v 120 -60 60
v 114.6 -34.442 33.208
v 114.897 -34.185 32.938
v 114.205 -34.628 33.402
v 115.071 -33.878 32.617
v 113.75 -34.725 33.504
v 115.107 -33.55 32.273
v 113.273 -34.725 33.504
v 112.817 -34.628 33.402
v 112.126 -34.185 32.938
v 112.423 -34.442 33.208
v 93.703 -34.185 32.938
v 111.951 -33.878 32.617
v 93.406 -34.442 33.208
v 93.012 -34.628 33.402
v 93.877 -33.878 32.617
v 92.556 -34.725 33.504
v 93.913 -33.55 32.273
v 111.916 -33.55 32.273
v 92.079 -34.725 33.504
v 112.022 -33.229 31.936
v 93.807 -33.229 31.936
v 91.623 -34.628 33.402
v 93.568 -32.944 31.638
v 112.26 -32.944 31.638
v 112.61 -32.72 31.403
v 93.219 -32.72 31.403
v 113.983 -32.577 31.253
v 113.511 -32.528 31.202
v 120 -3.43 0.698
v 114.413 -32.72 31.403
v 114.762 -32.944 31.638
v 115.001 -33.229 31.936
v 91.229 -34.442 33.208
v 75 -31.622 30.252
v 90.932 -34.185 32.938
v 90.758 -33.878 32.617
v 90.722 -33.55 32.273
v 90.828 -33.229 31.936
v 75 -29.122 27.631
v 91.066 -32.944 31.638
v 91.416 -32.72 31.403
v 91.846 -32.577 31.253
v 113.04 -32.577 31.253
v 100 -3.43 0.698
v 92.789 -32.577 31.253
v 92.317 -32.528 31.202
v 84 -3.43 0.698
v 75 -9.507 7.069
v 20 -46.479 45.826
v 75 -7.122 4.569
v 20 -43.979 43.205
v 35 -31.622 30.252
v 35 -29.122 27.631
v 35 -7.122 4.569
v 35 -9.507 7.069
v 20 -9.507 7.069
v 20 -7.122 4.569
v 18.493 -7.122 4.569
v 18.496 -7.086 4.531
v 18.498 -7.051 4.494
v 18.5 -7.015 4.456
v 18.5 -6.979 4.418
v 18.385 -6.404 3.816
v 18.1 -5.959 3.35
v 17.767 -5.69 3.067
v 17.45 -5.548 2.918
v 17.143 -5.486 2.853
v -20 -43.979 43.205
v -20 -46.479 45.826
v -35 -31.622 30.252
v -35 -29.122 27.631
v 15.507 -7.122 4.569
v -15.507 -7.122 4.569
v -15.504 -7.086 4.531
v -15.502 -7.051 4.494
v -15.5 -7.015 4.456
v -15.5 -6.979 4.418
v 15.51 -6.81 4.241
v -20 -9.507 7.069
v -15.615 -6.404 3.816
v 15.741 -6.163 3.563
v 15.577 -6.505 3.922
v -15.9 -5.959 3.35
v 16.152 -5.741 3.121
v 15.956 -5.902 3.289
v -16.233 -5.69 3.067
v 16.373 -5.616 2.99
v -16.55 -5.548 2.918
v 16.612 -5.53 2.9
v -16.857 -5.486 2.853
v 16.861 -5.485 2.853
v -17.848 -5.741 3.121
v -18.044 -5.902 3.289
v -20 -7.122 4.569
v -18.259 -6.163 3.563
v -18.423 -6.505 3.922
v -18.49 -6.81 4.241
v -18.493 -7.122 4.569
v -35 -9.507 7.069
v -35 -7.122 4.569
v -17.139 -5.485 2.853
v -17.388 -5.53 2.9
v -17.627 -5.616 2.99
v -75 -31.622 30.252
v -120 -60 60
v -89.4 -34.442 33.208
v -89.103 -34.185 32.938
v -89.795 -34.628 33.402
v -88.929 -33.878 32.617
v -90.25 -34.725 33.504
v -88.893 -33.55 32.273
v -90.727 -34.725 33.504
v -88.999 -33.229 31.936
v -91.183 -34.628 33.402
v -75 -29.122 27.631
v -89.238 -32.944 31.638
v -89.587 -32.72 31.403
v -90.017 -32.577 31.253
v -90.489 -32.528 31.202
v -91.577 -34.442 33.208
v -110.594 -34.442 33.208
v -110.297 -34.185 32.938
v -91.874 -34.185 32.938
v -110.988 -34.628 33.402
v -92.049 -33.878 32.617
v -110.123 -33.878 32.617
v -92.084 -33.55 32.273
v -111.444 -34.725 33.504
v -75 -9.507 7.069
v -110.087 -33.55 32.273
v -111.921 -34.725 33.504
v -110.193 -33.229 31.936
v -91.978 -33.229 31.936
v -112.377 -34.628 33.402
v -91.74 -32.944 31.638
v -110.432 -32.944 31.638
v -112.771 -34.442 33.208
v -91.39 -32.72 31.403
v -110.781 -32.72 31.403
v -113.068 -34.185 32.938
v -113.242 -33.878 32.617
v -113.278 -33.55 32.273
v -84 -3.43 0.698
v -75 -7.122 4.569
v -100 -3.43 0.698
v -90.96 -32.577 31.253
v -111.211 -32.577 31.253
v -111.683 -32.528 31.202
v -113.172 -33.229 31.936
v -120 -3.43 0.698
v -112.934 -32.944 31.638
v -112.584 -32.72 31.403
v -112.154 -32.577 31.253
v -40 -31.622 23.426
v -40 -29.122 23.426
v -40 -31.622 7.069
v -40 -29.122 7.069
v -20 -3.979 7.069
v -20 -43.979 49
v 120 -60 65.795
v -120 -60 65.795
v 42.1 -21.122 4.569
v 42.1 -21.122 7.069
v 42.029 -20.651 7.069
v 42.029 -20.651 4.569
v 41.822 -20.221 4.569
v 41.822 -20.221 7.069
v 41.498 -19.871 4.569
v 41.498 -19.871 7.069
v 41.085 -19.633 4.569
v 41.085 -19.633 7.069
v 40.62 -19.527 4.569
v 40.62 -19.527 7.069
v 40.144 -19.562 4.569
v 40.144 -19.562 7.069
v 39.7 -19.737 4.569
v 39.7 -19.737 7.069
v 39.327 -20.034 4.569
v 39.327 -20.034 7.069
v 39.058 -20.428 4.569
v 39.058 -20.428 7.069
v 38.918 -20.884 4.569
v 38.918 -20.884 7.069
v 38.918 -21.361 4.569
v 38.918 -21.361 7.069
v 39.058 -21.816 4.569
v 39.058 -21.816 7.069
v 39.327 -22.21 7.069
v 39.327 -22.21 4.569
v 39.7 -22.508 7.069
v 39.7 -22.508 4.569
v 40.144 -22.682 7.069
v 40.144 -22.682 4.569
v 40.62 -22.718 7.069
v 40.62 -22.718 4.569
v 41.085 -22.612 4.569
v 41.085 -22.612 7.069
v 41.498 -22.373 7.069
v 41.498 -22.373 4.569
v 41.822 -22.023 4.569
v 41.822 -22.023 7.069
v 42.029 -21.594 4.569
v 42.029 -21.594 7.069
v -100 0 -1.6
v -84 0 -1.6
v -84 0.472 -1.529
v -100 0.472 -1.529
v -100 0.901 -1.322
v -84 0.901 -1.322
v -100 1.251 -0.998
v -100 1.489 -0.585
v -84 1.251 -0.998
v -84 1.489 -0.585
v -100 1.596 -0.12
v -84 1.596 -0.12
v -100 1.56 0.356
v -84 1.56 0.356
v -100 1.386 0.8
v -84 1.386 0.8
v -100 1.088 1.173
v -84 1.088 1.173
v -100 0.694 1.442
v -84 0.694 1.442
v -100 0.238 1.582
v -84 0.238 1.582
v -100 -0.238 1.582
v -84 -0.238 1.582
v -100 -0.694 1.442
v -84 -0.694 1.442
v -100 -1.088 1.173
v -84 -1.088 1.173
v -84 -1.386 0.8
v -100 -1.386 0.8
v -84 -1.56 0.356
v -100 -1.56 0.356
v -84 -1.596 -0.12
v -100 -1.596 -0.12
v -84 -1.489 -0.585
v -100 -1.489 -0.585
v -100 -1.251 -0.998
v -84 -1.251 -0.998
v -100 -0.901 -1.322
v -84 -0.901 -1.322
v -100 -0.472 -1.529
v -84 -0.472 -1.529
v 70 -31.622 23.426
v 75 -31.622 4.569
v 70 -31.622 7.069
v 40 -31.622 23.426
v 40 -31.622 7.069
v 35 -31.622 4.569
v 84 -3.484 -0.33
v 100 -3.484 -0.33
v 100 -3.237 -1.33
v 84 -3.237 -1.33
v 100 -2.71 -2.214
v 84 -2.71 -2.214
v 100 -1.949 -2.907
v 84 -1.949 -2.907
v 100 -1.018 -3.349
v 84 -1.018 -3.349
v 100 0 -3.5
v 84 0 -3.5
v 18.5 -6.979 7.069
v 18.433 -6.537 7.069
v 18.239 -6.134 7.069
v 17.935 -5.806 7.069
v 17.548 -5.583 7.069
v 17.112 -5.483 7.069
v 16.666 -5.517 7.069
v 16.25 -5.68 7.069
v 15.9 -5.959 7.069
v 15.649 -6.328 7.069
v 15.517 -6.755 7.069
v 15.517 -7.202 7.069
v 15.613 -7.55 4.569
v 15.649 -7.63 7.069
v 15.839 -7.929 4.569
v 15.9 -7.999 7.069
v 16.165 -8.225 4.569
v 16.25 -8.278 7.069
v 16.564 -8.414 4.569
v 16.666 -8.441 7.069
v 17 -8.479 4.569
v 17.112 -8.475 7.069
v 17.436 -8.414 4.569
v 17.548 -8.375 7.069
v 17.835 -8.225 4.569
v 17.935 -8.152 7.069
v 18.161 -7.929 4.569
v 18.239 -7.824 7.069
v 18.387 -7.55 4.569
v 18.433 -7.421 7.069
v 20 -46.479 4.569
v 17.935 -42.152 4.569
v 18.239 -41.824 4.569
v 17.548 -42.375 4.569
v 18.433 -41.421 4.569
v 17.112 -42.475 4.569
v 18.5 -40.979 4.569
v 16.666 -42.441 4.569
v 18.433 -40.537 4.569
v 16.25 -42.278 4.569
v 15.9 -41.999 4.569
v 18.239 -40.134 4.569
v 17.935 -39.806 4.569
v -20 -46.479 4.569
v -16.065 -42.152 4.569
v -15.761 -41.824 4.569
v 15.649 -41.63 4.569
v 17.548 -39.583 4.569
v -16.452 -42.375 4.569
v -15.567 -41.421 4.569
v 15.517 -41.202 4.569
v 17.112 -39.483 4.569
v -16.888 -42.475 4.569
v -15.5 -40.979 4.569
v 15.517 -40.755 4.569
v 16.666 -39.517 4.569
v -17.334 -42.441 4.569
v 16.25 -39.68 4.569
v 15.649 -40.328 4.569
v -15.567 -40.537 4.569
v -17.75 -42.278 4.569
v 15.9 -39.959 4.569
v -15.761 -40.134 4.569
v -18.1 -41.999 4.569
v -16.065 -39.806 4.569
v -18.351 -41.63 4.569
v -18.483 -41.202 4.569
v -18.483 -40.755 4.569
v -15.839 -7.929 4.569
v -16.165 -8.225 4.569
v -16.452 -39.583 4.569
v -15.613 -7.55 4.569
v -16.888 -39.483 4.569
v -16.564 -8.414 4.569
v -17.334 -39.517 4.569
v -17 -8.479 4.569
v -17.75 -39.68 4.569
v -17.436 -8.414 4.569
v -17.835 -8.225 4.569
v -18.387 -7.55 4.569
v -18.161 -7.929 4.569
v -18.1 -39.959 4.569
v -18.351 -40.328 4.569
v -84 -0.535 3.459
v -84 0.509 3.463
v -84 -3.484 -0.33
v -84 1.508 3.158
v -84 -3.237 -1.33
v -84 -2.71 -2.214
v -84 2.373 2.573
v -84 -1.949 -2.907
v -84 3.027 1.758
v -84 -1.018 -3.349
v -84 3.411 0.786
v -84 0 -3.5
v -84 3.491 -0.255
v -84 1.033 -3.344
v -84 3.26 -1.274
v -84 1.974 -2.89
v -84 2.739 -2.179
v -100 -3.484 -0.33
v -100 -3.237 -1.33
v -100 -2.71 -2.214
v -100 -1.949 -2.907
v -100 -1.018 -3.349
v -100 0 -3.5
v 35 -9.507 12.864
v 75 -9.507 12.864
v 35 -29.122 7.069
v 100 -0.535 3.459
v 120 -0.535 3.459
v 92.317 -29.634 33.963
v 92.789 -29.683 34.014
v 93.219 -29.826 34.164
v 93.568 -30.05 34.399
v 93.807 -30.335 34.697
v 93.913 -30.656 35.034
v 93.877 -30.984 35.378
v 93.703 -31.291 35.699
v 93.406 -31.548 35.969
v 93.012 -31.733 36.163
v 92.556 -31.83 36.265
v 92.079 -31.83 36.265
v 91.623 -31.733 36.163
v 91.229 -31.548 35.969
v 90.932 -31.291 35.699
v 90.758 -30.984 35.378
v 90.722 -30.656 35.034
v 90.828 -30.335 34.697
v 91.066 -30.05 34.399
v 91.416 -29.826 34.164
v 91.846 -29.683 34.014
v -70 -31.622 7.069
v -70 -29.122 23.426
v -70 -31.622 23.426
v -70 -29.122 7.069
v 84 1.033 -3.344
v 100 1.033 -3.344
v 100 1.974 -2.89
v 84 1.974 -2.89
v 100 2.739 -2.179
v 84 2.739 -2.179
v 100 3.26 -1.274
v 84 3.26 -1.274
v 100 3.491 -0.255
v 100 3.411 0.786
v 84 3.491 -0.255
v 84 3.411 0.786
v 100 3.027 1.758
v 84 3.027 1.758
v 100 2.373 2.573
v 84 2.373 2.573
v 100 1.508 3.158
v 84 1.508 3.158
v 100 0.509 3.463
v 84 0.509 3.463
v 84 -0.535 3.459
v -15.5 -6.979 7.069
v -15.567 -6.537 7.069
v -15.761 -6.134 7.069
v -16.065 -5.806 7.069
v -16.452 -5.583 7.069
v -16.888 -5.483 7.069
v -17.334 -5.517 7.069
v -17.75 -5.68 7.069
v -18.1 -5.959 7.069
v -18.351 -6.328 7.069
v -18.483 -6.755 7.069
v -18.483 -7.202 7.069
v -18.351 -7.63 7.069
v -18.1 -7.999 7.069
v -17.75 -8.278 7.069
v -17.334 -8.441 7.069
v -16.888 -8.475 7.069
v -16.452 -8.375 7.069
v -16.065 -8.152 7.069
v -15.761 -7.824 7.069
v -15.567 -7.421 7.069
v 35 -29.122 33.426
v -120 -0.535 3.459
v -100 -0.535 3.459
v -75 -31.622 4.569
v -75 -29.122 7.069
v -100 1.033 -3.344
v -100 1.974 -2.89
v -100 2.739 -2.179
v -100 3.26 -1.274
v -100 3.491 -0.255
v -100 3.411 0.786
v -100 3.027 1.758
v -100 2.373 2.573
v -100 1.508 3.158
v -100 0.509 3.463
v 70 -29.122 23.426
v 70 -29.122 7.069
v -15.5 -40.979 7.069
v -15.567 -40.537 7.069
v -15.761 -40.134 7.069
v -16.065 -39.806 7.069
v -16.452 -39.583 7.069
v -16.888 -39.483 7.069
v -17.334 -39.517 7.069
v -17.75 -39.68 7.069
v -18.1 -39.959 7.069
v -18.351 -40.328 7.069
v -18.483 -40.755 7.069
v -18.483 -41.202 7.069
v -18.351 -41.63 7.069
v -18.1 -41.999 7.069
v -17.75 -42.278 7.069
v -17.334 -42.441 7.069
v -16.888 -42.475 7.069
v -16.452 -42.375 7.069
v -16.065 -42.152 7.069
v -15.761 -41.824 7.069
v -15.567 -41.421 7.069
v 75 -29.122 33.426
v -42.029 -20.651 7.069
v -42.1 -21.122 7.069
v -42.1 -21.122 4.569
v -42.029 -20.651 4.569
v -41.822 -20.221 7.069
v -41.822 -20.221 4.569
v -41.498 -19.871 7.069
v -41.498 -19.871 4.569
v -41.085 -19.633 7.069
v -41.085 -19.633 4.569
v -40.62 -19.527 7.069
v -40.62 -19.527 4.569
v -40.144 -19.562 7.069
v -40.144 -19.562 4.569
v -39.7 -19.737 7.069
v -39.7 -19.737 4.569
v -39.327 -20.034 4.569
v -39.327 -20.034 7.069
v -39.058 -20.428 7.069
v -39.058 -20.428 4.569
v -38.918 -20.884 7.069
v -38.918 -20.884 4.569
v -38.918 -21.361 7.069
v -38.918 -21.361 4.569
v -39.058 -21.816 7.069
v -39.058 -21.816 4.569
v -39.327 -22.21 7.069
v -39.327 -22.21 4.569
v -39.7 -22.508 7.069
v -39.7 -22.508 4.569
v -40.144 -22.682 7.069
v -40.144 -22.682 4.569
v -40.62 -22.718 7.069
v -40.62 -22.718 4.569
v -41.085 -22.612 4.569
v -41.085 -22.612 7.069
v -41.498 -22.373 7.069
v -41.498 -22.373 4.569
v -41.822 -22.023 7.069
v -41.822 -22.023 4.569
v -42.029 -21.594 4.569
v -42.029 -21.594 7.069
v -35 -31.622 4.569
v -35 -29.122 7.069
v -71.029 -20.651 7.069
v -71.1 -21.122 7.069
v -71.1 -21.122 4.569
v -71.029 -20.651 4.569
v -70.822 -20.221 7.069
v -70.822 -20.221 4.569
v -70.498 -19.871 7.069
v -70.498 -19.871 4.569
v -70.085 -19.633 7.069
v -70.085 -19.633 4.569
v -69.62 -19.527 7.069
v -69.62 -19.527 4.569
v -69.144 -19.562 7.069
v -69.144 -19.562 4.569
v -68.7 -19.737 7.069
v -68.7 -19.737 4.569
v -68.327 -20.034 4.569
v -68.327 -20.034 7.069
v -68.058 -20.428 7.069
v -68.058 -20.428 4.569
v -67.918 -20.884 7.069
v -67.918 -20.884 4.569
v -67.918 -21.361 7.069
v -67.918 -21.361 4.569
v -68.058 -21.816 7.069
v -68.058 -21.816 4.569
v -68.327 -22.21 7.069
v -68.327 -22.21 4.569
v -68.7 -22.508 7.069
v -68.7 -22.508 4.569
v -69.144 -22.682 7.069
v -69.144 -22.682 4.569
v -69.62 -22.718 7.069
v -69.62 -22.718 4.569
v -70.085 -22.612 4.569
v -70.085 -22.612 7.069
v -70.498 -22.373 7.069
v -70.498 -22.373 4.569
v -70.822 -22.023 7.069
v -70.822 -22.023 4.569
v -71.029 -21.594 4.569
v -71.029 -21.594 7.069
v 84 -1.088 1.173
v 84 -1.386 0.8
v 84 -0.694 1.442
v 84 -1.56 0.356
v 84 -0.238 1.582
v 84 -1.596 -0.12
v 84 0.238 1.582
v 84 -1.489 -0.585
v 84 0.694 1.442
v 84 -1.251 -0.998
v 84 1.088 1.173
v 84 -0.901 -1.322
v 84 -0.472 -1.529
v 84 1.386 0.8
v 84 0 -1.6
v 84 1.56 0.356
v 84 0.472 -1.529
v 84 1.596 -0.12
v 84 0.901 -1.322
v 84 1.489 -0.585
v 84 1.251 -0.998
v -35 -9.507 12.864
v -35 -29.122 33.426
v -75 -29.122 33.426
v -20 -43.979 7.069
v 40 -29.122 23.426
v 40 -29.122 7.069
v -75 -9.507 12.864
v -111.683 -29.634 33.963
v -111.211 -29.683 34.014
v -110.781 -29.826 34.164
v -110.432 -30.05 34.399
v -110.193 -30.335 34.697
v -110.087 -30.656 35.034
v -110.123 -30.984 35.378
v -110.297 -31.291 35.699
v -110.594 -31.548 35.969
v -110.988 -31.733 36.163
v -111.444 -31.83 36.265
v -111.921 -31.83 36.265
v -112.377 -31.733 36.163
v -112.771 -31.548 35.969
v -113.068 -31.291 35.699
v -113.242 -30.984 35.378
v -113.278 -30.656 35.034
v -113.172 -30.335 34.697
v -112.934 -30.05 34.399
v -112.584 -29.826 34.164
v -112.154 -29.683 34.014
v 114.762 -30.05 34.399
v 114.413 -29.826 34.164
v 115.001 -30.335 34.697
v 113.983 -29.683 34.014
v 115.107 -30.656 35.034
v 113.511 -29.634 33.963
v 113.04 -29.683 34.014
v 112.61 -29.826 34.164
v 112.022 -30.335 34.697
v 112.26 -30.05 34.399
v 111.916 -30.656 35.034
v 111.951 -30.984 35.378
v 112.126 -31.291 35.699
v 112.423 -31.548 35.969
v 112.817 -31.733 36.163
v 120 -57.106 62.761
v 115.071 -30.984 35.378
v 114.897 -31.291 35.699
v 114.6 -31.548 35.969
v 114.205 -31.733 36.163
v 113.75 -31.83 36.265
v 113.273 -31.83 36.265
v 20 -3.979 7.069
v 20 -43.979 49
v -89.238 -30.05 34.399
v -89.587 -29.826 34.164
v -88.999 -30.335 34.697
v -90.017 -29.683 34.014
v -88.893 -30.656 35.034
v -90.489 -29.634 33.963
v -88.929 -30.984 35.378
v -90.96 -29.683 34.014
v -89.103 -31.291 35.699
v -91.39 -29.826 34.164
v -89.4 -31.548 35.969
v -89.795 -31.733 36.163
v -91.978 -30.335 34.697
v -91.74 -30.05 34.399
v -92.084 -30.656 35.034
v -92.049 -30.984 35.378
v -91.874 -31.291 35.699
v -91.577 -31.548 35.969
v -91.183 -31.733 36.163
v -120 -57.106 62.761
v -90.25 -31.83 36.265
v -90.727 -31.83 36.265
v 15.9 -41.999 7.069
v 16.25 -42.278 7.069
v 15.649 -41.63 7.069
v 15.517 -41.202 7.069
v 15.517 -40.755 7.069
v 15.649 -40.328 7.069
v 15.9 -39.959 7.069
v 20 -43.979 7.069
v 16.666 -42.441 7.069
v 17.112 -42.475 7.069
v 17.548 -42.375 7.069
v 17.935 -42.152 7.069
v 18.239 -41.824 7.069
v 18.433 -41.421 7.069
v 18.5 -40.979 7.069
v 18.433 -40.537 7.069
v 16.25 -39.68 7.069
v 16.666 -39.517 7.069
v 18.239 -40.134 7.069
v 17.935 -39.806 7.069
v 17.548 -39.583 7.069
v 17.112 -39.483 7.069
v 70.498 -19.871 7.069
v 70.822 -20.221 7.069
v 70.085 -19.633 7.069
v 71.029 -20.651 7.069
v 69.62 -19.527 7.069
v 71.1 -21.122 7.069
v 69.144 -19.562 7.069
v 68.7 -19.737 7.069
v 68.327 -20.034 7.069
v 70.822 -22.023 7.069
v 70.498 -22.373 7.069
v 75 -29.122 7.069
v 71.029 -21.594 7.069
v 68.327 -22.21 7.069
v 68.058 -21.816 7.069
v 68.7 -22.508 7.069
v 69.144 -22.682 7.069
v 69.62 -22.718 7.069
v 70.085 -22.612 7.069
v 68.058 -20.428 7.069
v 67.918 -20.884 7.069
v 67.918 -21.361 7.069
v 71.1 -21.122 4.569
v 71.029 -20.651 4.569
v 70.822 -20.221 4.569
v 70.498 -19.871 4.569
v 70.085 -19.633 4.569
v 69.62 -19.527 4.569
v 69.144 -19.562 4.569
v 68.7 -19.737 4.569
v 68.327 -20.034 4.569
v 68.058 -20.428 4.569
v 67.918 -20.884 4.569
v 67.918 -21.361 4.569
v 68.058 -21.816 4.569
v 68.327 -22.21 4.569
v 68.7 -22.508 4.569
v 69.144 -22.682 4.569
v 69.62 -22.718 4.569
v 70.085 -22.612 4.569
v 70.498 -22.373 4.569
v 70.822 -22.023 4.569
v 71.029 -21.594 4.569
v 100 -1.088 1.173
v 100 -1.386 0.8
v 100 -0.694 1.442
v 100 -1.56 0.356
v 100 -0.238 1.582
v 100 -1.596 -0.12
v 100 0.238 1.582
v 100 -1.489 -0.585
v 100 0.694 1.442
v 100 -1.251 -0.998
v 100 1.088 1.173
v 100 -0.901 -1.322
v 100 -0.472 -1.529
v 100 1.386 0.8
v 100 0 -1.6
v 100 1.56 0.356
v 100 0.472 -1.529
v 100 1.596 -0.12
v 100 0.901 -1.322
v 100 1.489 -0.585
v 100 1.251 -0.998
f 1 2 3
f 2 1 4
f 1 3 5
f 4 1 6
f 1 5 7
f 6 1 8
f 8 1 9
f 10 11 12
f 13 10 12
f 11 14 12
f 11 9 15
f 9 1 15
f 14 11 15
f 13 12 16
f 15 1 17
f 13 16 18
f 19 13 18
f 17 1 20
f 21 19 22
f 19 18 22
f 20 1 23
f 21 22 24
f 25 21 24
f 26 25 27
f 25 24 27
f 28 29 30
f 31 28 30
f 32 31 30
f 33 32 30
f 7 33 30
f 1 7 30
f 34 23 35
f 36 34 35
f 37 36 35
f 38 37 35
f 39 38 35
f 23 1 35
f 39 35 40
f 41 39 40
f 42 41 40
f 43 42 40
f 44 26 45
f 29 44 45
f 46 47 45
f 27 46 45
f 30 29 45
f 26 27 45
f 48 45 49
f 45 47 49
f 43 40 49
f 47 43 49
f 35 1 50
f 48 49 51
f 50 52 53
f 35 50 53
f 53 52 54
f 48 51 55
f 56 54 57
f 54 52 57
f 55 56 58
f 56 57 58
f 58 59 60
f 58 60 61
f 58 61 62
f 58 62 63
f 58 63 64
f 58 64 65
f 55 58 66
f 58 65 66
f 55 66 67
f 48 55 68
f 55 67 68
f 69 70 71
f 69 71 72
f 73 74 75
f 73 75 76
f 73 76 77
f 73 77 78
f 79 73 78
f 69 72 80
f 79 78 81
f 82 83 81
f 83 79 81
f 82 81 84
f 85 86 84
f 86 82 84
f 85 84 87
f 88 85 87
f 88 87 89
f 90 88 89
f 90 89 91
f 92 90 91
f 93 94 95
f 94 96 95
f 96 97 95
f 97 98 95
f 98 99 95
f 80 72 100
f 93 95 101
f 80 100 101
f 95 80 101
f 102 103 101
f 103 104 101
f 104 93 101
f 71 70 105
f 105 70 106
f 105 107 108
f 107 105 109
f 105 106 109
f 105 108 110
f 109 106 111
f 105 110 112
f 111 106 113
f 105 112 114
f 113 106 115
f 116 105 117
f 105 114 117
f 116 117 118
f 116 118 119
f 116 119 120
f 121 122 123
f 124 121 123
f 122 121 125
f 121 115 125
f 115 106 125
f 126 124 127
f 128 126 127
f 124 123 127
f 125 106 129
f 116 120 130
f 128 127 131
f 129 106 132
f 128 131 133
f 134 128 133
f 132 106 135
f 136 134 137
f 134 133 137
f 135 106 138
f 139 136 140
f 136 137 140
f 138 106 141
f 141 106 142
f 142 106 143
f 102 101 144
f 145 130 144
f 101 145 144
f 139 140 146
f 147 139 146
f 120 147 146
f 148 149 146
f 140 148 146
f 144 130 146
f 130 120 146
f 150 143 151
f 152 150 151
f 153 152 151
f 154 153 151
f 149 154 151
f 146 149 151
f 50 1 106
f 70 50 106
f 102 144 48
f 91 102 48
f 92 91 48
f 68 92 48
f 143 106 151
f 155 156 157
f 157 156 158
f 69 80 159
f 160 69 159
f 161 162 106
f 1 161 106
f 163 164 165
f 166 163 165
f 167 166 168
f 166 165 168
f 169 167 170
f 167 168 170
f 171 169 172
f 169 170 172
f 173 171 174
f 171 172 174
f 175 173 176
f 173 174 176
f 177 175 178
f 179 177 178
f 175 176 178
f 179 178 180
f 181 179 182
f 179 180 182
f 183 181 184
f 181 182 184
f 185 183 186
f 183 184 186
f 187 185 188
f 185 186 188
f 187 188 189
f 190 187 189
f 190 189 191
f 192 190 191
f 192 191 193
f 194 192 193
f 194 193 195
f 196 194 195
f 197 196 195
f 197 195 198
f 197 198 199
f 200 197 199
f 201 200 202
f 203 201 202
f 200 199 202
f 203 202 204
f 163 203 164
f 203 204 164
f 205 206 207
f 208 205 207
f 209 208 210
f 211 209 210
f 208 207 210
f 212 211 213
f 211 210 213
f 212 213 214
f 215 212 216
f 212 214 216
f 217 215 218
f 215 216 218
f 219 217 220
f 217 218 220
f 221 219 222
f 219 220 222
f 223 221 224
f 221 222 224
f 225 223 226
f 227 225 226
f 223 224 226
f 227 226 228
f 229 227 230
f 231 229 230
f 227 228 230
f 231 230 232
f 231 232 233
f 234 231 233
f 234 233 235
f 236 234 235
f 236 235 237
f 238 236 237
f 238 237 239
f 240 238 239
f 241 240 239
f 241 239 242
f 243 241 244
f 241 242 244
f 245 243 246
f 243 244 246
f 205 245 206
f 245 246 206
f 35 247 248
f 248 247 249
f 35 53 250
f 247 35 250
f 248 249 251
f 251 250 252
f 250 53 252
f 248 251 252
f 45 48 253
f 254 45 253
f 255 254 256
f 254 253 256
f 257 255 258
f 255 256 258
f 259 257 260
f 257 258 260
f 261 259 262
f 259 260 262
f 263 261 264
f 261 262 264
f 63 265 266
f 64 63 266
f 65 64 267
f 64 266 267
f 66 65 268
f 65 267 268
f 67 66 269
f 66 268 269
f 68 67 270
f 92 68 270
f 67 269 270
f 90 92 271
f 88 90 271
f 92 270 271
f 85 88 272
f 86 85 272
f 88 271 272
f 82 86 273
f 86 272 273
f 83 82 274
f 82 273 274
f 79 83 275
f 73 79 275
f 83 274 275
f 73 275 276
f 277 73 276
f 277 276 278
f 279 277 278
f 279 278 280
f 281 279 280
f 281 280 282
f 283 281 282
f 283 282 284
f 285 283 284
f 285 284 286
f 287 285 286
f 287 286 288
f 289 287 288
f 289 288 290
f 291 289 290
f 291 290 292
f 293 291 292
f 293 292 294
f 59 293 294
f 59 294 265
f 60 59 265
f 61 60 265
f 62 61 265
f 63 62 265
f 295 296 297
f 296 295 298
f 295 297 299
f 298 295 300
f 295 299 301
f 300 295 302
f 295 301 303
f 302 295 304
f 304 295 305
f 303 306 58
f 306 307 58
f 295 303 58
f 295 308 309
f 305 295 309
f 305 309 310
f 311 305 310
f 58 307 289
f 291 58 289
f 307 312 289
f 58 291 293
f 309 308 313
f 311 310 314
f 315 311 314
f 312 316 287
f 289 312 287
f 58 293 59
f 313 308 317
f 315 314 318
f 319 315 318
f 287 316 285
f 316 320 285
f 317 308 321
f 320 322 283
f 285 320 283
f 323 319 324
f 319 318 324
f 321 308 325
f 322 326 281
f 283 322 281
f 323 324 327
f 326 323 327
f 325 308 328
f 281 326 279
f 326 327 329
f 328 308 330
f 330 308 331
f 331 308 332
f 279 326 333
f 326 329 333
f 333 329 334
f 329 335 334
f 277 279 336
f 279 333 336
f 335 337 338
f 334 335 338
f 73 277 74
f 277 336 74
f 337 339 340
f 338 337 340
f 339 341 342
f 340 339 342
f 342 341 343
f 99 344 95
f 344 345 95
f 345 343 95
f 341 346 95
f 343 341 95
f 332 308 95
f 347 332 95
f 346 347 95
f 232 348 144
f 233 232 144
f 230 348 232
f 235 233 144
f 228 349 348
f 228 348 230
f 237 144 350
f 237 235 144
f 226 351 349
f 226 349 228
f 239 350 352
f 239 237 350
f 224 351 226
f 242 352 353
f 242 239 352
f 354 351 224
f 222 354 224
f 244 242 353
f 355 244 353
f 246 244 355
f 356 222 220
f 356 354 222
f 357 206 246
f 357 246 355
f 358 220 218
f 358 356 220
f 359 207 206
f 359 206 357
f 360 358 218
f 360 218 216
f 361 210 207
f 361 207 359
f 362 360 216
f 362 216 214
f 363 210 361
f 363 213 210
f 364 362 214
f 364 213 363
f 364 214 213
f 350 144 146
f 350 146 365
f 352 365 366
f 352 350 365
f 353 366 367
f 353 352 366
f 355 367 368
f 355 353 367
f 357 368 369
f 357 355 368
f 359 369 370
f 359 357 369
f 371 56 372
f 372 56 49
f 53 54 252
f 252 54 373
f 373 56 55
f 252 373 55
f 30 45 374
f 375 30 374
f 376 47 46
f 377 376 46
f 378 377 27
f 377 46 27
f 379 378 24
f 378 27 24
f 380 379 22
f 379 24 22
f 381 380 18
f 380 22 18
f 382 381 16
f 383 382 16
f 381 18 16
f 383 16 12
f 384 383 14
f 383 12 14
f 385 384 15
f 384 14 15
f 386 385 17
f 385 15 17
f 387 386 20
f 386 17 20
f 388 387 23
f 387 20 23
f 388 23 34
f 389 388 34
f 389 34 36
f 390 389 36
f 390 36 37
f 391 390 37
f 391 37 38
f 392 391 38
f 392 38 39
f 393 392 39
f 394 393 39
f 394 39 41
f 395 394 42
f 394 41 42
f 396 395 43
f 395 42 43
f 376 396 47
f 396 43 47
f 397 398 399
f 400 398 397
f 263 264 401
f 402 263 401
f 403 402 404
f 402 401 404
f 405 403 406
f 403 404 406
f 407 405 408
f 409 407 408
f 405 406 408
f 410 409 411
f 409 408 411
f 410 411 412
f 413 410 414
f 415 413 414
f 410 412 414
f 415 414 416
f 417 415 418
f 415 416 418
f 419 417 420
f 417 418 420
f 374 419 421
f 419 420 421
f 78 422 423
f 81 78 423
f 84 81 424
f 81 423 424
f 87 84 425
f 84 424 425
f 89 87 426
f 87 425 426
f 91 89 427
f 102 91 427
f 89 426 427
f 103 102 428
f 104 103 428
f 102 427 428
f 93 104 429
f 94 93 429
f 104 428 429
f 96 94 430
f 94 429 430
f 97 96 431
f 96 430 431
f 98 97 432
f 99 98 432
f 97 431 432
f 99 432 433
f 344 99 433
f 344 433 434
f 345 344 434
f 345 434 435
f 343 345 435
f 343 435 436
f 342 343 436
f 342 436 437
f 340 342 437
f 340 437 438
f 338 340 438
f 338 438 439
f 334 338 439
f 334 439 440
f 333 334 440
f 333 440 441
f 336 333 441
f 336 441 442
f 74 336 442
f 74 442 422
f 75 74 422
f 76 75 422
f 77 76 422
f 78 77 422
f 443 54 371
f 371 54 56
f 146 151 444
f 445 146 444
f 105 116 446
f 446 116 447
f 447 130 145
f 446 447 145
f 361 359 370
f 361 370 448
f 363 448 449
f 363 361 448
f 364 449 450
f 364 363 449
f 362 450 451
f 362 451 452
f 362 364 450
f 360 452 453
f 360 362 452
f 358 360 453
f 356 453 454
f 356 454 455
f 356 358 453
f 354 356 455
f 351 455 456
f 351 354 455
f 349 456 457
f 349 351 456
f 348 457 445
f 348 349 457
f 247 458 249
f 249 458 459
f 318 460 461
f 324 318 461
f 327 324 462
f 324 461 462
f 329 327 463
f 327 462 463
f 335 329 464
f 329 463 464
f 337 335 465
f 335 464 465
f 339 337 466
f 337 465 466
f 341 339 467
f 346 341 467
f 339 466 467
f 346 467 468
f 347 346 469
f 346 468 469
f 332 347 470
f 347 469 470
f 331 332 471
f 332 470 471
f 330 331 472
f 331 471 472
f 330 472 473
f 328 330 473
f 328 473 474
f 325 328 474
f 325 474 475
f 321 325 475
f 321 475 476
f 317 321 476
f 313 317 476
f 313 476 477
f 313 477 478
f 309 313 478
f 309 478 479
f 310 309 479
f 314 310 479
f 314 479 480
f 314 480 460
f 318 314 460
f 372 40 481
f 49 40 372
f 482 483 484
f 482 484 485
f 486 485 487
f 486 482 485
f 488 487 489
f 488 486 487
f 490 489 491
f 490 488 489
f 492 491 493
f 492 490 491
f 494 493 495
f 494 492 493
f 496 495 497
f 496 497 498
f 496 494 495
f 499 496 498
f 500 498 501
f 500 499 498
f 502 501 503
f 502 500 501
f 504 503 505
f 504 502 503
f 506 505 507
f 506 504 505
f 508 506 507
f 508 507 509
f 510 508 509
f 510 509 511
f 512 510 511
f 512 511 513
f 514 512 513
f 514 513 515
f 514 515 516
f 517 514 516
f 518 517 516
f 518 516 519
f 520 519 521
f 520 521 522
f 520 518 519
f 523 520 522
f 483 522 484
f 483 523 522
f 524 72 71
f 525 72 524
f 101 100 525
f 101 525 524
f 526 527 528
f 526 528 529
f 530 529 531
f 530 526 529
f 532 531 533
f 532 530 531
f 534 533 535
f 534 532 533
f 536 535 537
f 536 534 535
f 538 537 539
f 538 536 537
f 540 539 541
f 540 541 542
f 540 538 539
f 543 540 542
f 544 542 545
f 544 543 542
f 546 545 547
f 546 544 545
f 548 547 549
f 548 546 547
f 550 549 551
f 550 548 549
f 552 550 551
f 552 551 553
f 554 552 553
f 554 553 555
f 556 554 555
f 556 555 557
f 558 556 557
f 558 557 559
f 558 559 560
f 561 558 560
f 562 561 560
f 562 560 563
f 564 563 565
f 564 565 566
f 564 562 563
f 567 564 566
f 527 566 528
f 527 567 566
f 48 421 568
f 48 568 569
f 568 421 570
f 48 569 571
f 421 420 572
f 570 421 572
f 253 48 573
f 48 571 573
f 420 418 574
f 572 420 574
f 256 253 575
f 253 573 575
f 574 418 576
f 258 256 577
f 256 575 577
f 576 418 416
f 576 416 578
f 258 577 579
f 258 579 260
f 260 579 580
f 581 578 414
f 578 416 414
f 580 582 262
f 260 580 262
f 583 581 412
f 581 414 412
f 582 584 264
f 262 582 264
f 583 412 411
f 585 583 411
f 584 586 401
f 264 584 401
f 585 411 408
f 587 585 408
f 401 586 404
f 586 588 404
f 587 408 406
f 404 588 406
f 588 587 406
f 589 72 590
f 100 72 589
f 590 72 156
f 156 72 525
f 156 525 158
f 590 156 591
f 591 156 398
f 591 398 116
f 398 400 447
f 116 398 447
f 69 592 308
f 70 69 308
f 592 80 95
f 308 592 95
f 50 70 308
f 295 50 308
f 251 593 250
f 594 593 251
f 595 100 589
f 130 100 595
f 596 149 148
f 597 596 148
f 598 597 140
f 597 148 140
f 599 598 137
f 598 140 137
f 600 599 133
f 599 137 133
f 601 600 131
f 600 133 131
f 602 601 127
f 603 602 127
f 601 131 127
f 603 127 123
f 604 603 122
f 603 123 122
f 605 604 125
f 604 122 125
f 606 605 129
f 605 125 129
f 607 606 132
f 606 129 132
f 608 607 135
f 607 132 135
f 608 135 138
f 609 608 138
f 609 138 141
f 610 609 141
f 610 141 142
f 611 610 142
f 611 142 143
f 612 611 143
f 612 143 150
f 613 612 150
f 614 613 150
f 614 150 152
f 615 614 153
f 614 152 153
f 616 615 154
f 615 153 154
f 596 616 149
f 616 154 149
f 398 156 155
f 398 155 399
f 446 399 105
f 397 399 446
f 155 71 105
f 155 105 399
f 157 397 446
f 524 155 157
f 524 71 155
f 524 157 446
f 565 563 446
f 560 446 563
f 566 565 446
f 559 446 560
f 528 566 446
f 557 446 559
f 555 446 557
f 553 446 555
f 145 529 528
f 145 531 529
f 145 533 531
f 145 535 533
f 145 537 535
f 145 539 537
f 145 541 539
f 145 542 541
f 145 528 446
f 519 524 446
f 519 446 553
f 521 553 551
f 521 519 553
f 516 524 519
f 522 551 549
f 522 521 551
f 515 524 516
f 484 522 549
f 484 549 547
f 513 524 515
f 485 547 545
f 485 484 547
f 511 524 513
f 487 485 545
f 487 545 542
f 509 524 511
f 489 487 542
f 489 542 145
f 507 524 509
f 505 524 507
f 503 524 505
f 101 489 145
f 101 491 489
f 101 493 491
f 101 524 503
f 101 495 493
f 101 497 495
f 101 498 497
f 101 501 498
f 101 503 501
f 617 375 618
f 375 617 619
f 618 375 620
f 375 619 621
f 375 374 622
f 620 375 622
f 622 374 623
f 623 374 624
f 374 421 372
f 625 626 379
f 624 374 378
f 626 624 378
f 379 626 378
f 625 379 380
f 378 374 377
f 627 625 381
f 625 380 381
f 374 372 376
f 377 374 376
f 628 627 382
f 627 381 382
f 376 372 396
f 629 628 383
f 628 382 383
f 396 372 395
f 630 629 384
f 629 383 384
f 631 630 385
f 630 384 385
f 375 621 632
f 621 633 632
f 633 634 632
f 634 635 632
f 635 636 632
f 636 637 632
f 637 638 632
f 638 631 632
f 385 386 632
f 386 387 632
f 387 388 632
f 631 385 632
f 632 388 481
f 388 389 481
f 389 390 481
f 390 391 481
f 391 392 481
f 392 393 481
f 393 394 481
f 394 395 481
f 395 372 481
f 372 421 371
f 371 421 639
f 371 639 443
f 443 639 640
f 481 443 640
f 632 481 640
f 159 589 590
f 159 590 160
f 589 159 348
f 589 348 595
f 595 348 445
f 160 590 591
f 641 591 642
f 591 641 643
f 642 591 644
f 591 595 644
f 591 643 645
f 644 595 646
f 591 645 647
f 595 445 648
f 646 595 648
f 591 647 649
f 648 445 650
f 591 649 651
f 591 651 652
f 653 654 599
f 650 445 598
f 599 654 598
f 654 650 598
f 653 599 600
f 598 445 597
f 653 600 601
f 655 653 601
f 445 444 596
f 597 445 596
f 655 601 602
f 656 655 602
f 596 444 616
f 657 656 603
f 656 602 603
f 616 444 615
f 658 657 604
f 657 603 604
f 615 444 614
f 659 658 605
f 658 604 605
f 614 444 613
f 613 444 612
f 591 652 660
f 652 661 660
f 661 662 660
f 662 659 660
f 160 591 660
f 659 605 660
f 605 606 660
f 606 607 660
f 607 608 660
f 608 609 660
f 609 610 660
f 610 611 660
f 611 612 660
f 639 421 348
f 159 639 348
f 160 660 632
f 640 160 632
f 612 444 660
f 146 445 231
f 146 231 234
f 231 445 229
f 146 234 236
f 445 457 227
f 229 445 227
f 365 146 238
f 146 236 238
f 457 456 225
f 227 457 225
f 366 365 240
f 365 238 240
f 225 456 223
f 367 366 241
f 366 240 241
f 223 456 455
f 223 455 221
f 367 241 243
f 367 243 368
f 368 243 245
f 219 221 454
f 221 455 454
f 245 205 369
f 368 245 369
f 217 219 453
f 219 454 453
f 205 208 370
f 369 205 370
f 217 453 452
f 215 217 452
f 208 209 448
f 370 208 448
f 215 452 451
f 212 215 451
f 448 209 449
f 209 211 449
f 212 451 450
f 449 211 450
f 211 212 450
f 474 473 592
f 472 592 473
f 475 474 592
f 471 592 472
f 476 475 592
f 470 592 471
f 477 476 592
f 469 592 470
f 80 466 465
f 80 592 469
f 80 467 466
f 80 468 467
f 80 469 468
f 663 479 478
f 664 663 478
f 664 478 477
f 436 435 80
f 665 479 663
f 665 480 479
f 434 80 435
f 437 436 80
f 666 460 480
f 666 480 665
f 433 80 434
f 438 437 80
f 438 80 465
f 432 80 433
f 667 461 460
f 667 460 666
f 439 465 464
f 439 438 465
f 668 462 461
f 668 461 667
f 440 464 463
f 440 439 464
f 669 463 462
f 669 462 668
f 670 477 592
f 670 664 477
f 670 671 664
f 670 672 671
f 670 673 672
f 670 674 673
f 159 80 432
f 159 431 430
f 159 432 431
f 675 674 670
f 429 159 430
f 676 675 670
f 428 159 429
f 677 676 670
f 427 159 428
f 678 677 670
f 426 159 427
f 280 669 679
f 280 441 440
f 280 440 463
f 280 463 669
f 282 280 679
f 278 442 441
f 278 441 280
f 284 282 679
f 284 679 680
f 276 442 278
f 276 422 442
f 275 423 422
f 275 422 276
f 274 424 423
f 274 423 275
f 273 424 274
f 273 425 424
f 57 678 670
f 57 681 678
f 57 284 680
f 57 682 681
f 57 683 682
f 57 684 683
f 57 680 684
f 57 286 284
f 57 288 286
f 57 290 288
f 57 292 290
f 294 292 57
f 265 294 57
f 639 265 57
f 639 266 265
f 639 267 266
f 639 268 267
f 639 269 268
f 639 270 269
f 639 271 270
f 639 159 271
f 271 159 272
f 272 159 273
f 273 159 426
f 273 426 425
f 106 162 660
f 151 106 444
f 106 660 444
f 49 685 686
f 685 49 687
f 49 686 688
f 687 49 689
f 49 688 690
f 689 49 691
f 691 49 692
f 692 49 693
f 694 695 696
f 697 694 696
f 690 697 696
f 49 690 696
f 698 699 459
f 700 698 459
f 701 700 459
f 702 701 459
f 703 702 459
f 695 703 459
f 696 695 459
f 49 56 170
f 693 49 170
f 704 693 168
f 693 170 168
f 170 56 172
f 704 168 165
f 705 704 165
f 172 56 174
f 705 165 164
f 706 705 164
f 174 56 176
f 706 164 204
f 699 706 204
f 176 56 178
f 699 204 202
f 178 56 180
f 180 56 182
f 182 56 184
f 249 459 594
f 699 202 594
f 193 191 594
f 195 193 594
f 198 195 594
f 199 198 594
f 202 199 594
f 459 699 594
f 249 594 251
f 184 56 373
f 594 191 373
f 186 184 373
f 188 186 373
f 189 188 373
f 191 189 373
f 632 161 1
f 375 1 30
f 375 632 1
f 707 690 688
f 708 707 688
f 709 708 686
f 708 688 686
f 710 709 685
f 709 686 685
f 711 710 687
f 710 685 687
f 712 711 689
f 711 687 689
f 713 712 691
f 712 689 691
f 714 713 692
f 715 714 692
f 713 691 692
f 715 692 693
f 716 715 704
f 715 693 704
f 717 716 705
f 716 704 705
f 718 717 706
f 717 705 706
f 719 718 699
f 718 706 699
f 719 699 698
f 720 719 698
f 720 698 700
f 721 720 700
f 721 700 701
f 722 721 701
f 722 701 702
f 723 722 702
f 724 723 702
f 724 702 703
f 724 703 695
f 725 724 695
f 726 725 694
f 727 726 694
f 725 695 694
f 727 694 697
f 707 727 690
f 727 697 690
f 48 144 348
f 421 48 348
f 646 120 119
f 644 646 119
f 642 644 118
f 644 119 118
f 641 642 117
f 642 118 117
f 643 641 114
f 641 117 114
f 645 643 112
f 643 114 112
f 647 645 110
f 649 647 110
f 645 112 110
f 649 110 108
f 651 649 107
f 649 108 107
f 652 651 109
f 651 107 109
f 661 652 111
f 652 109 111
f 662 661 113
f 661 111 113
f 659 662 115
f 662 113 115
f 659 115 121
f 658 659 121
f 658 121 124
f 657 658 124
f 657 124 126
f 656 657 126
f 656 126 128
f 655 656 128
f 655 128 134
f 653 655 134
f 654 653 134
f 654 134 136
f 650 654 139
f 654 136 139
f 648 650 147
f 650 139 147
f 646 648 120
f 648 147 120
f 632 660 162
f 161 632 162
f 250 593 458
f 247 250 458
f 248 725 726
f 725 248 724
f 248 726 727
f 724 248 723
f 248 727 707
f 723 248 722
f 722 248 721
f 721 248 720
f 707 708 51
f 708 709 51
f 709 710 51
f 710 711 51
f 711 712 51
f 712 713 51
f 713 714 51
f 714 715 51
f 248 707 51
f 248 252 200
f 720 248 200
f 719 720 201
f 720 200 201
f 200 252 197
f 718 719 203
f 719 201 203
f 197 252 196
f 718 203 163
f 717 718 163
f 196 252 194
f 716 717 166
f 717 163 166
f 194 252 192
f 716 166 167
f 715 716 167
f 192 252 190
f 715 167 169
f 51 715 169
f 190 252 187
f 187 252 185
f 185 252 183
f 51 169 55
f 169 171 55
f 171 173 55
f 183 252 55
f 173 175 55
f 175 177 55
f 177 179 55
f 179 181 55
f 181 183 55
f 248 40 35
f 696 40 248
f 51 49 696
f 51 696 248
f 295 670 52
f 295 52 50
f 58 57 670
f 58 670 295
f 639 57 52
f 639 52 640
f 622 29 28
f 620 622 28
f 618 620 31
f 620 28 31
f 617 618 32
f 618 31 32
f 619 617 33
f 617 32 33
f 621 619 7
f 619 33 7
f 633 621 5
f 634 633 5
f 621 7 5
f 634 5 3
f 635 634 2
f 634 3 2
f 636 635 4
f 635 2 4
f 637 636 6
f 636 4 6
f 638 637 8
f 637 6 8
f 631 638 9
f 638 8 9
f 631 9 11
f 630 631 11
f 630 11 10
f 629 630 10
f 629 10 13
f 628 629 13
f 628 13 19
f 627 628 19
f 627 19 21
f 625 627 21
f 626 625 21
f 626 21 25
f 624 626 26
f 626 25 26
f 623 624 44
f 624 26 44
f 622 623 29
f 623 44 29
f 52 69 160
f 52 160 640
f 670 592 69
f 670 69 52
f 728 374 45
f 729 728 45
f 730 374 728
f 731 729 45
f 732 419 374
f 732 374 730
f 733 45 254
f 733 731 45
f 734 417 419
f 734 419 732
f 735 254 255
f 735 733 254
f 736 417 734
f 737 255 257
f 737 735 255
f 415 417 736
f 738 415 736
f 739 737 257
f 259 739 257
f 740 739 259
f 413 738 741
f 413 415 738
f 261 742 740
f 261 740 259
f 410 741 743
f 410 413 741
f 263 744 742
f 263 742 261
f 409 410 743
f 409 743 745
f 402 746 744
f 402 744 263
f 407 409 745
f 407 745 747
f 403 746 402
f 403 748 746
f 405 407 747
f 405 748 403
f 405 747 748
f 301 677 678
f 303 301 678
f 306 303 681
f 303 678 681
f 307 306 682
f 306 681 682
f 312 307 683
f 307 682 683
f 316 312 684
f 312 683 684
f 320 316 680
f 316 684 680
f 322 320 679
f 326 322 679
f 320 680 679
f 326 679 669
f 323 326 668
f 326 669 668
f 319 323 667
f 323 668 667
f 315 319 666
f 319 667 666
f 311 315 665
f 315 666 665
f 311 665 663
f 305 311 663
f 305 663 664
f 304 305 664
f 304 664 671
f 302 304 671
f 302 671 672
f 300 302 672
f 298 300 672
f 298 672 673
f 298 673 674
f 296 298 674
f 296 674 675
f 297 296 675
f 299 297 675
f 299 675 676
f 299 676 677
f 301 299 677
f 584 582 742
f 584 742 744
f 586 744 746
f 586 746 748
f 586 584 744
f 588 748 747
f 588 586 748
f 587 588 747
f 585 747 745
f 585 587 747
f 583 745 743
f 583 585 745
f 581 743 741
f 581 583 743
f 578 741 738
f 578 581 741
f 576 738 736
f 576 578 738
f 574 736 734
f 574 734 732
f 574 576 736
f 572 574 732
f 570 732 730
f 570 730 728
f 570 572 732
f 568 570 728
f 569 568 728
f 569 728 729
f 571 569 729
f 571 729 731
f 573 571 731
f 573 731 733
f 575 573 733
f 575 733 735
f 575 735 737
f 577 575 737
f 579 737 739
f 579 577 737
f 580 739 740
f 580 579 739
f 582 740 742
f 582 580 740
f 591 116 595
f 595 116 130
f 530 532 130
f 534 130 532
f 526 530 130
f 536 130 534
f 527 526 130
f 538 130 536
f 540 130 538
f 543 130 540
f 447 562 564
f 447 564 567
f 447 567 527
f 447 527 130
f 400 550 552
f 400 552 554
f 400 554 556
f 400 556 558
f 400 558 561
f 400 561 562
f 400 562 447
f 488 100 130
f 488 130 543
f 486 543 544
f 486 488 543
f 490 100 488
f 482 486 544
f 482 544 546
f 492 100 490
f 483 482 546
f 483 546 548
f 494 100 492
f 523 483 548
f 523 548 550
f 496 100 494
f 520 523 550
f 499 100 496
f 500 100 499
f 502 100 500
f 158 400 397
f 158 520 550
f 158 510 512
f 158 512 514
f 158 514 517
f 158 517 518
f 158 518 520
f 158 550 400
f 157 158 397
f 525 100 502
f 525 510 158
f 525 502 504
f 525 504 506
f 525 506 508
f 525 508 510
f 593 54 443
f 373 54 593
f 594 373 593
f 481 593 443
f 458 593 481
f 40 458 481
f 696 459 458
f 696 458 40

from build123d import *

# Parameters (mm, degrees)
EXTRUDE_1_DEPTH      = 120
EXTRUDE_1_DEPTH_BACK = 120
EXTRUDE_START        = 84
SKETCH_1_5_R         = 1.6
EXTRUDE_2_DEPTH      = 16
EXTRUDE_3_DEPTH      = 20
EXTRUDE_3_DEPTH_BACK = 20
CUT_EXTRUDE_1_REACH  = 148.454
SKETCH_3_W           = 40
SKETCH_3_H           = 34.471908326
SKETCH_3_H_2         = 5.528091674
SKETCH_4_R           = 1.5
CUT_EXTRUDE_2_DEPTH  = 147.454080652
EXTRUDE_START_2      = 35
SKETCH_5_W           = 2.5
SKETCH_5_H           = 2.5
EXTRUDE_4_DEPTH      = 40
CUT_EXTRUDE_3_REACH  = 148.454
SKETCH_6_W           = 40
SKETCH_6_H           = 19.615168576
SKETCH_7_W           = 30
SKETCH_7_H           = 16.35748171
CUT_EXTRUDE_4_DEPTH  = 2.5
SKETCH_8_R           = 1.6
CUT_EXTRUDE_5_DEPTH  = 2.5
SKETCH_9_R           = 1.6
CUT_EXTRUDE_6_DEPTH  = 4


with BuildPart() as part:
    # 草图1 → 凸台-拉伸1 (new, two sides: drawn at the far end of the back side and taken through both)
    with BuildSketch(Plane(origin=(0, 0, 0), x_dir=(0, 0, -1), z_dir=(1, 0, 0)).offset(-EXTRUDE_1_DEPTH_BACK)):
        with BuildLine():
            Line((-3.458804046, -0.535419994), (-62.760974675, -57.105691992))
            Line((-62.760974675, -57.105691992), (-60, -60))
            Line((-60, -60), (-0.697829371, -3.429728002))
            ThreePointArc((-0.697829371, -3.429728002), (-2.532519507, -2.41585284), (-3.458804046, -0.535419994))
        make_face()
        Polygon((-62.760974675, -57.105691992), (-65.795054966, -60), (-60, -60), align=None)
        with BuildLine():
            Line((-0.697829371, -3.429728002), (-3.458804046, -0.535419994))
            ThreePointArc((-3.458804046, -0.535419994), (-2.532519507, -2.41585284), (-0.697829371, -3.429728002))
        make_face()
    extrude(amount=EXTRUDE_1_DEPTH + EXTRUDE_1_DEPTH_BACK)

    # 草图1<5> → 凸台-拉伸2 (add)
    with BuildSketch(Plane(origin=(0, 0, 0), x_dir=(0, 0, -1), z_dir=(1, 0, 0)).offset(EXTRUDE_START)):
        with BuildLine():
            ThreePointArc((3.5, 0), (-0.268501246, 3.489685814), (-3.458804046, -0.535419994))
            Line((-3.458804046, -0.535419994), (-0.697829371, -3.429728002))
            ThreePointArc((-0.697829371, -3.429728002), (2.214452212, -2.710387684), (3.5, 0))
        make_face()
        Circle(SKETCH_1_5_R, mode=Mode.SUBTRACT)
    extrude_2 = extrude(amount=EXTRUDE_2_DEPTH)

    # 镜向1: 凸台-拉伸2 across plane
    add(extrude_2.mirror(Plane(origin=(0, 0, 0), x_dir=(0, 0, 1), z_dir=(1, 0, 0))))

    # 草图2 → 凸台-拉伸3 (add, two sides: drawn at the far end of the back side and taken through both)
    with BuildSketch(Plane(origin=(0, 0, 0), x_dir=(0, 0, -1), z_dir=(1, 0, 0)).offset(-EXTRUDE_3_DEPTH_BACK)):
        Polygon((-4.568589556, -7.12217221), (-7.068589556, -9.507003634), (-7.068589556, -43.97891196), (-43.205219579, -43.97891196), (-45.82594989, -46.47891196), (-4.568589556, -46.47891196), align=None)
    extrude(amount=EXTRUDE_3_DEPTH + EXTRUDE_3_DEPTH_BACK)

    # 切除-拉伸1: up to this face of the body (flat: up to its plane)
    cut_extrude_1_end = Plane(part.part.faces().sort_by_distance((0, -30.267709997, 34.626929506))[0])
    # 草图3 → 切除-拉伸1 (cut, up to the picked face)
    with BuildSketch(Plane.XY.offset(7.068589556), mode=Mode.PRIVATE) as cut_extrude_1_sk1:
        with Locations((0, -26.742957797)):
            Rectangle(SKETCH_3_W, SKETCH_3_H)
    cut_extrude_1_tool1 = split(extrude(cut_extrude_1_sk1.sketch, amount=CUT_EXTRUDE_1_REACH, mode=Mode.PRIVATE), bisect_by=cut_extrude_1_end, keep=Keep.BOTH, mode=Mode.PRIVATE)
    # 草图3 → 切除-拉伸1 (cut, up to the picked face)
    with BuildSketch(Plane.XY.offset(7.068589556), mode=Mode.PRIVATE) as cut_extrude_1_sk2:
        with Locations((0, -6.742957797)):
            Rectangle(SKETCH_3_W, SKETCH_3_H_2)
    cut_extrude_1_tool2 = split(extrude(cut_extrude_1_sk2.sketch, amount=CUT_EXTRUDE_1_REACH, mode=Mode.PRIVATE), bisect_by=cut_extrude_1_end, keep=Keep.BOTH, mode=Mode.PRIVATE)
    add(cut_extrude_1_tool1.solids().sort_by(Axis((0, -26.742958, 7.06859), (0, 0, 1)))[0], mode=Mode.SUBTRACT)
    add(cut_extrude_1_tool2.solids().sort_by(Axis((0, -6.742958, 7.06859), (0, 0, 1)))[0], mode=Mode.SUBTRACT)

    # 草图4 → 切除-拉伸2 (cut, through all)
    with BuildSketch(Plane.XY.offset(7.068589556)):
        with Locations((-17, -6.97891196)):
            Circle(SKETCH_4_R)
        with Locations((17, -6.97891196)):
            Circle(SKETCH_4_R)
        with Locations((17, -40.97891196)):
            Circle(SKETCH_4_R)
        with Locations((-17, -40.97891196)):
            Circle(SKETCH_4_R)
    extrude(amount=-CUT_EXTRUDE_2_DEPTH, mode=Mode.SUBTRACT)

    # 草图5 → 凸台-拉伸4 (add)
    with BuildSketch(Plane(origin=(0, 0, 0), x_dir=(0, 0, -1), z_dir=(1, 0, 0)).offset(EXTRUDE_START_2)):
        Polygon((-27.6310163, -29.12217221), (-30.251746612, -31.62217221), (-7.068589556, -31.62217221), (-7.068589556, -29.12217221), align=None)
        Polygon((-7.068589556, -29.12217221), (-4.568589556, -29.12217221), (-4.568589556, -7.12217221), (-7.068589556, -9.507003634), align=None)
        with Locations((-5.818589556, -30.37217221)):
            Rectangle(SKETCH_5_W, SKETCH_5_H)
    extrude_4 = extrude(amount=EXTRUDE_4_DEPTH)

    # 切除-拉伸3: up to this plane
    cut_extrude_3_end = Plane(origin=(-120, 1.447154004, 1.380487337), z_dir=(0, -0.7235770020149496, -0.6902436686816169))
    # 草图6 → 切除-拉伸3 (cut, up to the surface)
    with BuildSketch(Plane.XY.offset(7.068589556), mode=Mode.PRIVATE) as cut_extrude_3_sk1:
        with Locations((55, -19.314587922)):
            Rectangle(SKETCH_6_W, SKETCH_6_H)
    cut_extrude_3_tool1 = split(extrude(cut_extrude_3_sk1.sketch, amount=CUT_EXTRUDE_3_REACH, mode=Mode.PRIVATE), bisect_by=cut_extrude_3_end, keep=Keep.BOTH, mode=Mode.PRIVATE)
    cut_extrude_3 = cut_extrude_3_tool1.solids().sort_by_distance((55, -19.314588, 7.06859))[0]
    add(cut_extrude_3, mode=Mode.SUBTRACT)

    # 草图7 → 切除-拉伸4 (cut)
    with BuildSketch(Plane(origin=(0, -29.12217221, 0), x_dir=(1, 0, 0), z_dir=(0, 1, 0))):
        with Locations((55, -15.247330411)):
            Rectangle(SKETCH_7_W, SKETCH_7_H)
    cut_extrude_4 = extrude(amount=-CUT_EXTRUDE_4_DEPTH, mode=Mode.SUBTRACT)

    # 草图8 → 切除-拉伸5 (cut)
    with BuildSketch(Plane.XY.offset(7.068589556)):
        with Locations((40.5, -21.12217221)):
            Circle(SKETCH_8_R)
        with Locations((69.5, -21.12217221)):
            Circle(SKETCH_8_R)
    cut_extrude_5 = extrude(amount=-CUT_EXTRUDE_5_DEPTH, mode=Mode.SUBTRACT)

    # 镜向2: 凸台-拉伸4 across plane
    add(extrude_4.mirror(Plane(origin=(0, 0, 0), x_dir=(0, 0, 1), z_dir=(1, 0, 0))))

    # 镜向3: 切除-拉伸4 across plane
    add(cut_extrude_4.mirror(Plane(origin=(0, 0, 0), x_dir=(0, 0, 1), z_dir=(1, 0, 0))), mode=Mode.SUBTRACT)

    # 镜向4: 切除-拉伸5 across plane
    add(cut_extrude_5.mirror(Plane(origin=(0, 0, 0), x_dir=(0, 0, 1), z_dir=(1, 0, 0))), mode=Mode.SUBTRACT)

    # 镜向5: 切除-拉伸3 across plane
    add(cut_extrude_3.mirror(Plane(origin=(0, 0, 0), x_dir=(0, 0, 1), z_dir=(1, 0, 0))), mode=Mode.SUBTRACT)

    # 草图9 → 切除-拉伸6 (cut)
    with BuildSketch(Plane(origin=(0, -1.447154004, -1.380487337), x_dir=(1, 0, 0), z_dir=(0, -0.7235770020149502, -0.6902436686816162))):
        with Locations(Location((113.511233503, 46.629240242, 0), (0, 0, 270))):
            Circle(SKETCH_9_R)
        with Locations(Location((92.317392528, 46.629240242, 0), (0, 0, 270))):
            Circle(SKETCH_9_R)
        with Locations(Location((-90.488766497, 46.629240242, 0), (0, 0, 270))):
            Circle(SKETCH_9_R)
        with Locations(Location((-111.682607472, 46.629240242, 0), (0, 0, 270))):
            Circle(SKETCH_9_R)
    extrude(amount=-CUT_EXTRUDE_6_DEPTH, mode=Mode.SUBTRACT)


solid = part.part
